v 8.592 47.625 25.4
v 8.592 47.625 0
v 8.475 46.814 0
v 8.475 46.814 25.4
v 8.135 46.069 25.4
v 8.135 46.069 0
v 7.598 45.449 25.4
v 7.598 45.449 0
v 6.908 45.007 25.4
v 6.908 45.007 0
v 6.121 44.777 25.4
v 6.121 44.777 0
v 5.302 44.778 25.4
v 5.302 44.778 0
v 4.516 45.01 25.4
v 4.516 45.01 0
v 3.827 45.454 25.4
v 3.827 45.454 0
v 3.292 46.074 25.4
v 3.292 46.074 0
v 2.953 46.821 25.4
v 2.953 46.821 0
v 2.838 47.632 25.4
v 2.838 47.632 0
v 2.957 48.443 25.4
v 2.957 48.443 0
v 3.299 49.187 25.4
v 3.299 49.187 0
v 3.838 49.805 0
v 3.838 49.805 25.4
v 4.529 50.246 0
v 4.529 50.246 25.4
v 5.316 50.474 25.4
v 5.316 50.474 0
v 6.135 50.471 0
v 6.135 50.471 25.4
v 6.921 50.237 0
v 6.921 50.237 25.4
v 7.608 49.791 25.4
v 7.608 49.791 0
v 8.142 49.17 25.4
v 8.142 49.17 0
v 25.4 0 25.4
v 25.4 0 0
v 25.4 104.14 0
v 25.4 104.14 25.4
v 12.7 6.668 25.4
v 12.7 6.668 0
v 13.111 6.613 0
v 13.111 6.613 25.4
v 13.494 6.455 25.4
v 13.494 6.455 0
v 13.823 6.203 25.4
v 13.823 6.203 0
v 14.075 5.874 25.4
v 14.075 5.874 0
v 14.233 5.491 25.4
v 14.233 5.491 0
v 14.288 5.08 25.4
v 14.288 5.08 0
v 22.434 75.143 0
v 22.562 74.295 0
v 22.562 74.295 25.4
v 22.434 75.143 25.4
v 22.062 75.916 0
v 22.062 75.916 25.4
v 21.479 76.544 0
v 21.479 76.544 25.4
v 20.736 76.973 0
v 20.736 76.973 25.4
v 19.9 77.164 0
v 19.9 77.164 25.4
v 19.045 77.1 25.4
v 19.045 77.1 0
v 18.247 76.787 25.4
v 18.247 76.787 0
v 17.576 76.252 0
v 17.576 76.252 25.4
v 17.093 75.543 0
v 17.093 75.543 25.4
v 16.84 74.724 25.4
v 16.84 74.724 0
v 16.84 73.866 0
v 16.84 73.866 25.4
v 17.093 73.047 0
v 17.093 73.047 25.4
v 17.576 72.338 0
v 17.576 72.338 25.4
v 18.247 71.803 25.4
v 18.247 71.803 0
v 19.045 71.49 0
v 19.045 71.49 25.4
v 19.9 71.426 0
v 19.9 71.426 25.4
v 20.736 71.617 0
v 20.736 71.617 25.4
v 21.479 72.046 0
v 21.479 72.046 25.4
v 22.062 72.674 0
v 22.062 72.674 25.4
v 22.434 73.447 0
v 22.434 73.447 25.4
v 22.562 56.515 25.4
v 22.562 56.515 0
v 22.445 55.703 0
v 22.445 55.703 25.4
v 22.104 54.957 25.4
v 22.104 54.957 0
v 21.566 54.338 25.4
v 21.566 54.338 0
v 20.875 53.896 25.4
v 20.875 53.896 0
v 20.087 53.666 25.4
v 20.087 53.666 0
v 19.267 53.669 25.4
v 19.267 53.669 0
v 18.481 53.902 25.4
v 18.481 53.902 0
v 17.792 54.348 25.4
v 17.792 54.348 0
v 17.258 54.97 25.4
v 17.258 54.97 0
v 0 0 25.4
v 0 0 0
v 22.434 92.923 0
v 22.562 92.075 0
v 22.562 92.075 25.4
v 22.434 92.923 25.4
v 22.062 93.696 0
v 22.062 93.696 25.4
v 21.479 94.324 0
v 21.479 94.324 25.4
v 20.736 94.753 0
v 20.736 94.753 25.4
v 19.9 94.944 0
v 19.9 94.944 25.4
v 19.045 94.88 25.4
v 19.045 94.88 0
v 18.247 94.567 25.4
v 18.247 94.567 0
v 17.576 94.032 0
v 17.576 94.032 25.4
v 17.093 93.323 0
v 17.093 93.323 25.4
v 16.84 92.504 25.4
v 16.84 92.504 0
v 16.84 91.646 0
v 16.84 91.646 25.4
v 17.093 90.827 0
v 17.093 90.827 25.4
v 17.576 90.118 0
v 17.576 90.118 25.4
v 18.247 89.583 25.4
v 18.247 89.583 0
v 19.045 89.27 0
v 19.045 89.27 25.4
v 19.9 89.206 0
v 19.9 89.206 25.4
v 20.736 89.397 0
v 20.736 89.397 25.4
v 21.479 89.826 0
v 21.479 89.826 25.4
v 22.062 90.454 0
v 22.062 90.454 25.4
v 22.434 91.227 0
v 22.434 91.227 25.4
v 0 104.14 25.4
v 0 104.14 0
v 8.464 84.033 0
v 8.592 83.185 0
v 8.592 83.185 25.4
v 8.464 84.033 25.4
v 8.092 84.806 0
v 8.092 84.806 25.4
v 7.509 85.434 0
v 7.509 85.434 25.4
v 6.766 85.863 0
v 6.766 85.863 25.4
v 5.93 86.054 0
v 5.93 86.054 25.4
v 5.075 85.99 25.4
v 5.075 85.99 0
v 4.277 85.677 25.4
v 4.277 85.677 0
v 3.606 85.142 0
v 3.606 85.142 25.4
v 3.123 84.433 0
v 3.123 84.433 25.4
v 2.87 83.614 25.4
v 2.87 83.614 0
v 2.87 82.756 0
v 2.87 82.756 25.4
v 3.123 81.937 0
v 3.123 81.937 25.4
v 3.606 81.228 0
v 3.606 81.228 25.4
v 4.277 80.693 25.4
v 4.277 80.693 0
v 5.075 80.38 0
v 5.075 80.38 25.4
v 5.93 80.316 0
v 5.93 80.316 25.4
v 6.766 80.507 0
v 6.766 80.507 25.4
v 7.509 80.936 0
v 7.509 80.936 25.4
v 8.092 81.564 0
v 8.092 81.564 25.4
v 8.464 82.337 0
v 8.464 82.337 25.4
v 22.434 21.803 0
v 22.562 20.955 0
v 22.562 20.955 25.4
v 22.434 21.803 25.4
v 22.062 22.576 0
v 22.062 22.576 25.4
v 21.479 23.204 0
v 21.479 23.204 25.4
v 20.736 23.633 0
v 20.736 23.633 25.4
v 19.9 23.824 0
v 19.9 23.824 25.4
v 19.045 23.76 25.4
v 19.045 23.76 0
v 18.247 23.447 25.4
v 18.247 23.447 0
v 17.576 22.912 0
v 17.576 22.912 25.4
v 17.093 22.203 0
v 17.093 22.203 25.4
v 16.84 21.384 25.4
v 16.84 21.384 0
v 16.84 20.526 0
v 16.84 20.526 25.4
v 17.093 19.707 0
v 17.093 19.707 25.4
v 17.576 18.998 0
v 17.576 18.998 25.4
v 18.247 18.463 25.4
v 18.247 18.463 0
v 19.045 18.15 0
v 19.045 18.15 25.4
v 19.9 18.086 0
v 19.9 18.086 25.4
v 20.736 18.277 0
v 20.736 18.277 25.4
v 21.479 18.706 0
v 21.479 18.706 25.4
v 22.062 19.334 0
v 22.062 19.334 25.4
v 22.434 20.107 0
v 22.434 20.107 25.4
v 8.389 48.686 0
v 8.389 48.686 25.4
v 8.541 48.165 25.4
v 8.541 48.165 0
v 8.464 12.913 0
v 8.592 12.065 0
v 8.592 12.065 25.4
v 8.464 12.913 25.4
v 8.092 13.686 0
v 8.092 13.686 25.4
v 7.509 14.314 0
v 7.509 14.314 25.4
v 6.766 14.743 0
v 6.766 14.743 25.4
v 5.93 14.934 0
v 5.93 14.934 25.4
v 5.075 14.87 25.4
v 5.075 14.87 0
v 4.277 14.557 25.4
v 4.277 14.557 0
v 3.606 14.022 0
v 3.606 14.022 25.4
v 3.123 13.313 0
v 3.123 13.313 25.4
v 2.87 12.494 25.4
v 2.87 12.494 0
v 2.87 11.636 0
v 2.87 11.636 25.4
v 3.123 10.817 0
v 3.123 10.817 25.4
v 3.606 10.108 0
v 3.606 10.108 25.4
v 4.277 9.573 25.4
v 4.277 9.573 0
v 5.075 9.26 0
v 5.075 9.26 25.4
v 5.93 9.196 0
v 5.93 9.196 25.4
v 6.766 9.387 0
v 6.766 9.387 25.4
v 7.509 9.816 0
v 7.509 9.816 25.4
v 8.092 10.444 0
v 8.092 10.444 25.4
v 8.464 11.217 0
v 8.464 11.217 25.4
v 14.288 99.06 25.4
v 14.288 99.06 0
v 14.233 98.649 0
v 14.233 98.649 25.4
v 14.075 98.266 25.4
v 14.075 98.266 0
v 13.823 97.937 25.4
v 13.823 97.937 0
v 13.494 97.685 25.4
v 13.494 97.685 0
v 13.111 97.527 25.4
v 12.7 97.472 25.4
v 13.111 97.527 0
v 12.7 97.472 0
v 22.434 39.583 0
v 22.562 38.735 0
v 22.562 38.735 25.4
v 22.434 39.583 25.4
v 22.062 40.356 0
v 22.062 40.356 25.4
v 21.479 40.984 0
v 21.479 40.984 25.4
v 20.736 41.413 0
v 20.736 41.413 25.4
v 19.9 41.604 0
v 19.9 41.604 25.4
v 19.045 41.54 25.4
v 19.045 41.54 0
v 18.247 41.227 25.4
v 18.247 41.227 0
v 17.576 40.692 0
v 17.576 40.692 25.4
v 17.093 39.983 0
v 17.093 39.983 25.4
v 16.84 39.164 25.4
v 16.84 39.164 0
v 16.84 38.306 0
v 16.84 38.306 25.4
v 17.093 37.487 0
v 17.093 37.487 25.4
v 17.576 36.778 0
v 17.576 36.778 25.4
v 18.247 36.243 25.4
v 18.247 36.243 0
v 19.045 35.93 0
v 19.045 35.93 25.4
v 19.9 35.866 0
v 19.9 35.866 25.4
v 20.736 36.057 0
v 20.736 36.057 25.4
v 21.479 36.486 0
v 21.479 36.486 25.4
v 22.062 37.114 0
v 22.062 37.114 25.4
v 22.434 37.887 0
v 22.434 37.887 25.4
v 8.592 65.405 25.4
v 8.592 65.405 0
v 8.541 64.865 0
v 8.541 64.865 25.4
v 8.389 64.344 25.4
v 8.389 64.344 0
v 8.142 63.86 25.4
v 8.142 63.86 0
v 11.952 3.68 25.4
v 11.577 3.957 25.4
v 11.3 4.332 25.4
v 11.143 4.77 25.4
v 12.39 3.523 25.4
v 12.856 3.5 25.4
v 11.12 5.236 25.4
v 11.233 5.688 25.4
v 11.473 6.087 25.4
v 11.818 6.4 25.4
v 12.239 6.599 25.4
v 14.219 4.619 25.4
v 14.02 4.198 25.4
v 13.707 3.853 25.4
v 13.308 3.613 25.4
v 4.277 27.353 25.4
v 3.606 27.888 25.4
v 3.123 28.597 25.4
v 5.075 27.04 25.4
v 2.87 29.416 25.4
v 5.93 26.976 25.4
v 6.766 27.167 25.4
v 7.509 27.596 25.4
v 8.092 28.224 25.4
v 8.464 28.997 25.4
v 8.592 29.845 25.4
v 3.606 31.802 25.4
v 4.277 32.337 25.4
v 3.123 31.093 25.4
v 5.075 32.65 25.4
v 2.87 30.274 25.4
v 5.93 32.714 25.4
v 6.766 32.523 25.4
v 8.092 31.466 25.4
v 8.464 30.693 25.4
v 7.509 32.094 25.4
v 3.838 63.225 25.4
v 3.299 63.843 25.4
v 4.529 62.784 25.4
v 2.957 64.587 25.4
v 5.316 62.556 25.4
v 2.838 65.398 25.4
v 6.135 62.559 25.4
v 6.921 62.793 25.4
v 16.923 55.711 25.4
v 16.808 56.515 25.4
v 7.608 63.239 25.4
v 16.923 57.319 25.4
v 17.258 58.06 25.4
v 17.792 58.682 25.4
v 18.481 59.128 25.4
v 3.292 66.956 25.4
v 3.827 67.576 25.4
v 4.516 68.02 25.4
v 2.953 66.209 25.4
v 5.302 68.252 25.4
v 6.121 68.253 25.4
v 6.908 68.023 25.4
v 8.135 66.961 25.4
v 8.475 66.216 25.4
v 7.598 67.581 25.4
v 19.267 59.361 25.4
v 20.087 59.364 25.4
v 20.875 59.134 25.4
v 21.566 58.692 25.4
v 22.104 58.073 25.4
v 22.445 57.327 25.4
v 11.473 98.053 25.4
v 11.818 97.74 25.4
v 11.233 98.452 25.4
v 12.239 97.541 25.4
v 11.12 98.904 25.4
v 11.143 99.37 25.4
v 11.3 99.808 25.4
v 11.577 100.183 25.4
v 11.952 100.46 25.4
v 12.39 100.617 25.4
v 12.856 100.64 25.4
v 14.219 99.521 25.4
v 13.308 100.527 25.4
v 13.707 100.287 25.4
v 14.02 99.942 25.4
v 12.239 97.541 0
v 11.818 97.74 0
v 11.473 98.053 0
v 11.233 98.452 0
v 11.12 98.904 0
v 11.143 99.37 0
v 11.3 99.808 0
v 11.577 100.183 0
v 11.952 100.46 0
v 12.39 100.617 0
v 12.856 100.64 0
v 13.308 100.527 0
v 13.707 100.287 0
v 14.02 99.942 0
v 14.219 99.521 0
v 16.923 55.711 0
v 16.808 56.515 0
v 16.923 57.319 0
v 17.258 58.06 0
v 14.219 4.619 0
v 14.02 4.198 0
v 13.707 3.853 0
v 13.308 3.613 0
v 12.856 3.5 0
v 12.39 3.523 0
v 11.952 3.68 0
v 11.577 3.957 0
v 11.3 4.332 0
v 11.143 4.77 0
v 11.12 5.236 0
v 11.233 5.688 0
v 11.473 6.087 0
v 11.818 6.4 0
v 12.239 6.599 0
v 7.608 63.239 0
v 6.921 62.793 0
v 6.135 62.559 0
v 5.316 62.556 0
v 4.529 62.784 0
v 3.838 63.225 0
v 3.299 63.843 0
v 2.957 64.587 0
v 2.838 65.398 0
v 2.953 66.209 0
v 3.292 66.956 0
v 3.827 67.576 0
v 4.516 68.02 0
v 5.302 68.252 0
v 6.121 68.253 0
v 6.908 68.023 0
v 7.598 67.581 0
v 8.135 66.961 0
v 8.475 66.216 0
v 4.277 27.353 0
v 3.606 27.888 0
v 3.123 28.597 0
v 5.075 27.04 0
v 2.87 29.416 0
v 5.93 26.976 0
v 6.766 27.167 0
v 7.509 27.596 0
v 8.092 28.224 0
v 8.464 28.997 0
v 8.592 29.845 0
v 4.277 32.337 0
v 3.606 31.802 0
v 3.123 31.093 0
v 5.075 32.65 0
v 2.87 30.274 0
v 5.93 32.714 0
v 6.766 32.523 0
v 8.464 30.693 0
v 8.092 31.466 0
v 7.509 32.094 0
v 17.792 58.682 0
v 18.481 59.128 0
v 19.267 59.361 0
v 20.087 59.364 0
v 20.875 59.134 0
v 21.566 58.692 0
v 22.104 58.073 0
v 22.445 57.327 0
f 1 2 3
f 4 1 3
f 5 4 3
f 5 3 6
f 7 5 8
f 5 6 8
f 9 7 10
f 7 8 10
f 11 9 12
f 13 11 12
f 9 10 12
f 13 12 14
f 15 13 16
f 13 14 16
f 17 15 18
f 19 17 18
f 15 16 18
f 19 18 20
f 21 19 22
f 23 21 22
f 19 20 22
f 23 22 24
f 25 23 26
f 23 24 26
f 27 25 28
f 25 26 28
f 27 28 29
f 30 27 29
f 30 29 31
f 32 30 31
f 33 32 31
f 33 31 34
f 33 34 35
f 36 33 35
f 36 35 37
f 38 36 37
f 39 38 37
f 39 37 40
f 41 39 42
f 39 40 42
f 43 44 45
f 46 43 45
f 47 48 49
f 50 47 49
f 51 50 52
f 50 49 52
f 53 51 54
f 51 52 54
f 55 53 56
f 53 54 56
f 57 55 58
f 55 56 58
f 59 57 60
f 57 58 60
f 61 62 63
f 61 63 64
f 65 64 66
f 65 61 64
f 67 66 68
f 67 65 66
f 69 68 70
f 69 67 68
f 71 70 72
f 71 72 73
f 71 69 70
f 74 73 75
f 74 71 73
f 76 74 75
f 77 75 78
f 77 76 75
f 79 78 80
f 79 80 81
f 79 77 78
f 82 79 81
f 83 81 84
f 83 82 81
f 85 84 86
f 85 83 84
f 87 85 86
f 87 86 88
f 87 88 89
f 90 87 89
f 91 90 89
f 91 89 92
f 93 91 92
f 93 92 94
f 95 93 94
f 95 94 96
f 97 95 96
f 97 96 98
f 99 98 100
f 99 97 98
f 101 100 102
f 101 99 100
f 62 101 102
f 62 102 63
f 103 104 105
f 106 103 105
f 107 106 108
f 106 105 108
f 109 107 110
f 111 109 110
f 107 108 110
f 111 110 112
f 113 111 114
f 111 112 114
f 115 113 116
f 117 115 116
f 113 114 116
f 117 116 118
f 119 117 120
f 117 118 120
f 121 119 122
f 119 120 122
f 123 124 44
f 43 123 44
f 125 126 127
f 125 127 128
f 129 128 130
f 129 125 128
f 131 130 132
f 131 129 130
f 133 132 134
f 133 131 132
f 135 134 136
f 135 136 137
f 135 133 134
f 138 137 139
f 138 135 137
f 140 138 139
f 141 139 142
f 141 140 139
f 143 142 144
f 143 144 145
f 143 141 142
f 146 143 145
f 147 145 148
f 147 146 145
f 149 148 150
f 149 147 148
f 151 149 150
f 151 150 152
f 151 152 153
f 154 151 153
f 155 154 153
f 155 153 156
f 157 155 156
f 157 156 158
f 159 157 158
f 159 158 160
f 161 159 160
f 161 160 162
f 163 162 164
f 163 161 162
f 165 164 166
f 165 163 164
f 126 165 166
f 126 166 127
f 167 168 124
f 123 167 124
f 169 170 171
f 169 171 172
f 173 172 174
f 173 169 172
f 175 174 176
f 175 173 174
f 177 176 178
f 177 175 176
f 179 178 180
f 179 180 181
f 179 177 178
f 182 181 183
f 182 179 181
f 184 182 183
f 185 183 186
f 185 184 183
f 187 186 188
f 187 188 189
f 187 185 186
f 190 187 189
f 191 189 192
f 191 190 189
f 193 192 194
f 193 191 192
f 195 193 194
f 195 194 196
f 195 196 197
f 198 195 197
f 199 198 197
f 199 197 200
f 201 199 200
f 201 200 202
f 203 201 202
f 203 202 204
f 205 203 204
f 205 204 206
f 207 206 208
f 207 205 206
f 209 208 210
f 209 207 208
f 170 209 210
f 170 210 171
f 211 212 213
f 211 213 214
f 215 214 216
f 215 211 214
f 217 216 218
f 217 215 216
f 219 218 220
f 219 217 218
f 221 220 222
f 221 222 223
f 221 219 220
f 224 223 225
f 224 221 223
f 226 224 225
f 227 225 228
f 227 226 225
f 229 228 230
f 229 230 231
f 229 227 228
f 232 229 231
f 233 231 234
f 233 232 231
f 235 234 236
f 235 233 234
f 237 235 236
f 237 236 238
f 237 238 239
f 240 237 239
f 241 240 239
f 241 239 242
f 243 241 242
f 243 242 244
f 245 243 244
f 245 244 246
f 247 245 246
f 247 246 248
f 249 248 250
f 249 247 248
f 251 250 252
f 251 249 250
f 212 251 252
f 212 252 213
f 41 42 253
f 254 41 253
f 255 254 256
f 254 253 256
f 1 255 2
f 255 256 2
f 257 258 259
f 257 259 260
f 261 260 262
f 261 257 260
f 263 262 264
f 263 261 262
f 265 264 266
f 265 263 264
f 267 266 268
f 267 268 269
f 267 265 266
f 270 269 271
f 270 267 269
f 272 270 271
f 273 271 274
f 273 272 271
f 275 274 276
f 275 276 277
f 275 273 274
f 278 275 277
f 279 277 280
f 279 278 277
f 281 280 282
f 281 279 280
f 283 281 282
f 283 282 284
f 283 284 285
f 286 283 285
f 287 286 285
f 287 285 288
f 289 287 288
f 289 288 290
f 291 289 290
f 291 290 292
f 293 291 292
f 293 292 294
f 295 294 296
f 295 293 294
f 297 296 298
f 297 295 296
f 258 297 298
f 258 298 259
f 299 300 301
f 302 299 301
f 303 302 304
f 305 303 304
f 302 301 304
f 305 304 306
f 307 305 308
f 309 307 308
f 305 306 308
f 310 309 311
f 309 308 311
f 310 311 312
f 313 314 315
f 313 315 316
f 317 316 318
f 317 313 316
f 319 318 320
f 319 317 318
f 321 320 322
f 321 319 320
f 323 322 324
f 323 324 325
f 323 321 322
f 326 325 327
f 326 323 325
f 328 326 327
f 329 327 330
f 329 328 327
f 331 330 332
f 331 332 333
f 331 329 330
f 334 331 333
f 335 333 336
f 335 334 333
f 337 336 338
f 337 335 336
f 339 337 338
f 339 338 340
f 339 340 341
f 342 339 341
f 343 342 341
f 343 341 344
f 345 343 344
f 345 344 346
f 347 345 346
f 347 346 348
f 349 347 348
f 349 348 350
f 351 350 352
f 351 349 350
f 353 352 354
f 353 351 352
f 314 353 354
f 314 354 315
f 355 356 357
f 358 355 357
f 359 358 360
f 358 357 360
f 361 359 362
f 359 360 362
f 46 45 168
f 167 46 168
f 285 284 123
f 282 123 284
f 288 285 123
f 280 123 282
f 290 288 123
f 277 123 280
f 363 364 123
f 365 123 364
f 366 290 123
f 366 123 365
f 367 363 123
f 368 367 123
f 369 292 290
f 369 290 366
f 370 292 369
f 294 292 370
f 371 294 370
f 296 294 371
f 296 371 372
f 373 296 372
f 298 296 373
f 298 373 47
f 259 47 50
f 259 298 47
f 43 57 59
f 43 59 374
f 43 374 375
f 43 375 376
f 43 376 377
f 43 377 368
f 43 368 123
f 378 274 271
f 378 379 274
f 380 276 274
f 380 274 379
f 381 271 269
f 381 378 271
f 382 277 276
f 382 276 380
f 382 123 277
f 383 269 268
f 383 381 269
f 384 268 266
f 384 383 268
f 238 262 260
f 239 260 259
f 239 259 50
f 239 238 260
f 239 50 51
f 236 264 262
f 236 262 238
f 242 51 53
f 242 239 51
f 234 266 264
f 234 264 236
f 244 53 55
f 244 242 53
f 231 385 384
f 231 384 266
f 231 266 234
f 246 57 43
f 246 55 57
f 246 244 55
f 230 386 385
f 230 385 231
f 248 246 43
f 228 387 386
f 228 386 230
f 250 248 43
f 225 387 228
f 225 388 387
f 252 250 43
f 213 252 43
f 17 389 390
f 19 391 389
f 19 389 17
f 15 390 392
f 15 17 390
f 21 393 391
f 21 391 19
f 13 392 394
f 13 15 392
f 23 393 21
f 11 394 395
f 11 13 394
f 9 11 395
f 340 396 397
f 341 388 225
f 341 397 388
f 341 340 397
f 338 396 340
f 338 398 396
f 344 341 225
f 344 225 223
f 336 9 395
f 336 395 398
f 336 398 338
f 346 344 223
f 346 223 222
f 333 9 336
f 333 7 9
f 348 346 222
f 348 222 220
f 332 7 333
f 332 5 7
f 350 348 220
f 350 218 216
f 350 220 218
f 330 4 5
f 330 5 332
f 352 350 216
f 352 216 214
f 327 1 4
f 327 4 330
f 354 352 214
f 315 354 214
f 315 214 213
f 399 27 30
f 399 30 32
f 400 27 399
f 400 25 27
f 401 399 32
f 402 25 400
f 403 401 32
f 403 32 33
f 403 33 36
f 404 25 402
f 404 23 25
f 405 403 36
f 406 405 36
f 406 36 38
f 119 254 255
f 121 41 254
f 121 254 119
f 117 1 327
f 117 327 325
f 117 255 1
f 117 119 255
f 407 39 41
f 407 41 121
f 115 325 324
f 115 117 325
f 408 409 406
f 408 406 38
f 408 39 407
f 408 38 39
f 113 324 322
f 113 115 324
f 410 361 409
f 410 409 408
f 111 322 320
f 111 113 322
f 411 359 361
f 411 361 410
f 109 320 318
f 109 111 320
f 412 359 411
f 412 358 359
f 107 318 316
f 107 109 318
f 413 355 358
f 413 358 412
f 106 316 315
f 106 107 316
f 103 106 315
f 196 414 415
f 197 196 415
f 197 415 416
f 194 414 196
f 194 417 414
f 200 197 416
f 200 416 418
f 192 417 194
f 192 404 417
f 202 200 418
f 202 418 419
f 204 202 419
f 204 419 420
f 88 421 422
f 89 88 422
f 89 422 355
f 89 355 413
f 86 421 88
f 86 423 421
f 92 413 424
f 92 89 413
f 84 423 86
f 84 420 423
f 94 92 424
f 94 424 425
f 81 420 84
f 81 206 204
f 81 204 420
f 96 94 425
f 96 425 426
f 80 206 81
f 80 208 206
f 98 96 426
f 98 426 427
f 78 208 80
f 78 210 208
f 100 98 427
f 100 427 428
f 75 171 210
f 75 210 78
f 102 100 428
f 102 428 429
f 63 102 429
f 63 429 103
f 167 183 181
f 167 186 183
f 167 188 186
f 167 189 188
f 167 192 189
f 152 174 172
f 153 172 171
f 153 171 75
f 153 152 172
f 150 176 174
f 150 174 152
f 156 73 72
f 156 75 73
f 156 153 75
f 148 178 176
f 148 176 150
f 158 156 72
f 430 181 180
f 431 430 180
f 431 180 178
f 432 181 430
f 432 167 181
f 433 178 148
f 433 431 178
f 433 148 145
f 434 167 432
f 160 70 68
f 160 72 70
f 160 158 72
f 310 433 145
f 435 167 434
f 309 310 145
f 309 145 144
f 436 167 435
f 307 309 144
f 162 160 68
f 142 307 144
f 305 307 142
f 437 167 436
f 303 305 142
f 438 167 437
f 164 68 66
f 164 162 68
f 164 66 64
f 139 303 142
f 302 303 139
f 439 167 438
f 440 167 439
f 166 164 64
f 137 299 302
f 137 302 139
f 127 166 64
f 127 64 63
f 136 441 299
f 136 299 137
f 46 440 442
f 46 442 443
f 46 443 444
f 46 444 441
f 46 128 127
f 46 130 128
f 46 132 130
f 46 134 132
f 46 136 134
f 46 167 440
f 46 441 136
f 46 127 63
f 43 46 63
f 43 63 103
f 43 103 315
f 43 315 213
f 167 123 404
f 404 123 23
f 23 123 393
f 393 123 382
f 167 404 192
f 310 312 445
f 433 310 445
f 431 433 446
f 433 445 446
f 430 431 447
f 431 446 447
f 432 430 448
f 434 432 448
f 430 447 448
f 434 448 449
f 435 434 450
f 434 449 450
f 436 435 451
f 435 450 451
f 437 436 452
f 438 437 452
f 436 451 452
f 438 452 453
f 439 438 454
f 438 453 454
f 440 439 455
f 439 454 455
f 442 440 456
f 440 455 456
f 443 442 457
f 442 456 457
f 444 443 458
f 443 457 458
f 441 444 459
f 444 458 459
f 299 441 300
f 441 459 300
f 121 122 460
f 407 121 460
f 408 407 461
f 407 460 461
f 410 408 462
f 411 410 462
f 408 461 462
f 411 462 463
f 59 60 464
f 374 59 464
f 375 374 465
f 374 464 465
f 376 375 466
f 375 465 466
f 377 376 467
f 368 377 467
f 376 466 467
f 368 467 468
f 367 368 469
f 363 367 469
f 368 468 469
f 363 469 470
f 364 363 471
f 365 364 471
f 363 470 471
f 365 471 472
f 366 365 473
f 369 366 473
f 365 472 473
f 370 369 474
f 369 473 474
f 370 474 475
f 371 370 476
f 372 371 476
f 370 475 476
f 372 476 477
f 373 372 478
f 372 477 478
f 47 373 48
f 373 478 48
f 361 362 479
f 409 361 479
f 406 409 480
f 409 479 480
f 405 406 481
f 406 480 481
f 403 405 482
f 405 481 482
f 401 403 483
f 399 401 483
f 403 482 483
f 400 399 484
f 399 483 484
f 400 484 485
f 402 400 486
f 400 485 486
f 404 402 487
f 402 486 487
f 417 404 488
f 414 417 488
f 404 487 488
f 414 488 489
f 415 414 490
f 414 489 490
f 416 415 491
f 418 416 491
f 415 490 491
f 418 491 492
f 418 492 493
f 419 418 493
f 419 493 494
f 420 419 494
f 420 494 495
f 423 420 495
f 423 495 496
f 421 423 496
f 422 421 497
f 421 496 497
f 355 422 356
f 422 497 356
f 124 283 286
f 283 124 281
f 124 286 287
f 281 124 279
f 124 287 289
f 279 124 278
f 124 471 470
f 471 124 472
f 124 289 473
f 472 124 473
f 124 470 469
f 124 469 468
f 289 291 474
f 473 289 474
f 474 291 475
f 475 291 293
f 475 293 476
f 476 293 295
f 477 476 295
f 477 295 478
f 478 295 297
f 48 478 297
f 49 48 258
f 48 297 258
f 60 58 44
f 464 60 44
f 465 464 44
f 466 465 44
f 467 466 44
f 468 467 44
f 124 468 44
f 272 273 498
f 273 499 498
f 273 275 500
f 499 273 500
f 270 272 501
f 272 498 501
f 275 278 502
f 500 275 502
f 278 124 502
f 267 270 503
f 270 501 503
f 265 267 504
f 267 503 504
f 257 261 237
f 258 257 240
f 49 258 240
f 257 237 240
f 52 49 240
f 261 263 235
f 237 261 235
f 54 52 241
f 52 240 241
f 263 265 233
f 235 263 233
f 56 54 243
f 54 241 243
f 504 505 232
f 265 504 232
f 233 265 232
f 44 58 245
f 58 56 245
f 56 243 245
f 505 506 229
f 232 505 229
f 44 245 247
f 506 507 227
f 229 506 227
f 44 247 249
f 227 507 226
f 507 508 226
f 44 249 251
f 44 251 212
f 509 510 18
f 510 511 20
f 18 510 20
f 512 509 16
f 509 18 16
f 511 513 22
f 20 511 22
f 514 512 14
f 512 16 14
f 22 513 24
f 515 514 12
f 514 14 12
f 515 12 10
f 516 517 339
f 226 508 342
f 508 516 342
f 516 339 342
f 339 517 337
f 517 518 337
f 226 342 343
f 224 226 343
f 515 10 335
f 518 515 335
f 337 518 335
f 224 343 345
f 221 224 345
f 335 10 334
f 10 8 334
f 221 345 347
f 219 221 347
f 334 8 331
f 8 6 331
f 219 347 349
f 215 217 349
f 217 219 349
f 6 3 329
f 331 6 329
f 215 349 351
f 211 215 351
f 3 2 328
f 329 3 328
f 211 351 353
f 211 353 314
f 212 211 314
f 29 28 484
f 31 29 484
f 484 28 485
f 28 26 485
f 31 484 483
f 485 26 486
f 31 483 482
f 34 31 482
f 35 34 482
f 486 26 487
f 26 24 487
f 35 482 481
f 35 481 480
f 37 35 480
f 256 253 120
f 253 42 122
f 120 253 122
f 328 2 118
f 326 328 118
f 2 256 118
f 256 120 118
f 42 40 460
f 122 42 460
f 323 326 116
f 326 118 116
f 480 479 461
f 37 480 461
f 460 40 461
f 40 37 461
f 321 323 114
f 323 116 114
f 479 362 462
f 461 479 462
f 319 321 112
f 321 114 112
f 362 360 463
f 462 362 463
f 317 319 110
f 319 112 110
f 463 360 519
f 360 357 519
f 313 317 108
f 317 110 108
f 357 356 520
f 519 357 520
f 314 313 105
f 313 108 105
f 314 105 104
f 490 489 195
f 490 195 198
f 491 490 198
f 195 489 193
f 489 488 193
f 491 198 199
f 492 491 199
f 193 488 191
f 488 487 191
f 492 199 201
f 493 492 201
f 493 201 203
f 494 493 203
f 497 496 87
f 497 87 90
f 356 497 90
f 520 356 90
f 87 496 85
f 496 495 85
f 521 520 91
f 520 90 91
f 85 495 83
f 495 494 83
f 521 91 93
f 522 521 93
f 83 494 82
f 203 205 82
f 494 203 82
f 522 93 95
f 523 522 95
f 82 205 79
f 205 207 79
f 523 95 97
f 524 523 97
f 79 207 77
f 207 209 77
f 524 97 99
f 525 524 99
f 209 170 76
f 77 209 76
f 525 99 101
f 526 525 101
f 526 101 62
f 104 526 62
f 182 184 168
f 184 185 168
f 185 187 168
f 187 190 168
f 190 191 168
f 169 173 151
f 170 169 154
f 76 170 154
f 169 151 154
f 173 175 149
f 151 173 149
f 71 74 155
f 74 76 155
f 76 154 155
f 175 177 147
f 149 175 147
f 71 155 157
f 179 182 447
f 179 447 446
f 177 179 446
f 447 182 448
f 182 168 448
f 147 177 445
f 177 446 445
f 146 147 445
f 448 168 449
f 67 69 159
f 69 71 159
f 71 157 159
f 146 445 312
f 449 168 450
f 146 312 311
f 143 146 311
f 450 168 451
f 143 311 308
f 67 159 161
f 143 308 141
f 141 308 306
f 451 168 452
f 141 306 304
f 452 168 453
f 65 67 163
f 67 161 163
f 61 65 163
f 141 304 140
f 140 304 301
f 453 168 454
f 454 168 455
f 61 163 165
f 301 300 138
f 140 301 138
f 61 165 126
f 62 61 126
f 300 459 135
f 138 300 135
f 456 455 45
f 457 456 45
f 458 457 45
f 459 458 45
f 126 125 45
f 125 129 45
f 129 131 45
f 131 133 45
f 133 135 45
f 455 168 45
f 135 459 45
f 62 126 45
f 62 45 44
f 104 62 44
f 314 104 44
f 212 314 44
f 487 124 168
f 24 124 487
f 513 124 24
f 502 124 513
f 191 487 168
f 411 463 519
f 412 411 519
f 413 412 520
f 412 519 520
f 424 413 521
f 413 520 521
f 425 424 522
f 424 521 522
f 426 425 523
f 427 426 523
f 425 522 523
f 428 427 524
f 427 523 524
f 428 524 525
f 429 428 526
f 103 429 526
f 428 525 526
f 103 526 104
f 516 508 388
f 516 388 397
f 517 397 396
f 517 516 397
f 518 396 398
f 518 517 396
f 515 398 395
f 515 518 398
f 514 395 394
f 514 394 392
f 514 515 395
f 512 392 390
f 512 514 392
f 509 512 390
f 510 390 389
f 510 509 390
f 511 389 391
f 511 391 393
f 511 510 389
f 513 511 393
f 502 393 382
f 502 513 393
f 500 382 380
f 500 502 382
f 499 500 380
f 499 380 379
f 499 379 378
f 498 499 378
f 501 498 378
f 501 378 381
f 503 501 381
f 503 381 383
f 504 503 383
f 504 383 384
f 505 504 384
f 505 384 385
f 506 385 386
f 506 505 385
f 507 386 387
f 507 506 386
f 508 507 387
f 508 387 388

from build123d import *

# Parameters (mm, degrees)
F0_R     = 2.8769537575
F1_DEPTH = 25.4


with BuildPart() as f1:
    # F0 (on Top) → F1 (new body)
    with BuildSketch(Plane.XY):
        Polygon((0, 52.07), (0, 0), (25.4, 0), (25.4, 104.14), (0, 104.14), align=None)
        with Locations((5.715, 12.065)):
            Circle(F0_R, mode=Mode.SUBTRACT)
        with BuildLine():
            ThreePointArc((14.2875, 5.08), (11.5774679849, 3.9574679849), (12.7, 6.6675))
            ThreePointArc((12.7, 6.6675), (13.8225320151, 6.2025320151), (14.2875, 5.08))
        make_face(mode=Mode.SUBTRACT)
        with Locations((5.715, 29.845)):
            Circle(F0_R, mode=Mode.SUBTRACT)
        with BuildLine():
            ThreePointArc((8.5919537575, 47.625), (2.9527786647, 46.820639249), (8.1421750872, 49.1695659646))
            ThreePointArc((8.1421750872, 49.1695659646), (8.4772213353, 48.429360751), (8.5919537575, 47.625))
        make_face(mode=Mode.SUBTRACT)
        with Locations((19.685, 20.955)):
            Circle(F0_R, mode=Mode.SUBTRACT)
        with Locations((19.685, 38.735)):
            Circle(F0_R, mode=Mode.SUBTRACT)
        with BuildLine():
            ThreePointArc((8.5919537575, 65.405), (8.4772213353, 64.600639249), (8.1421750872, 63.8604340354))
            ThreePointArc((8.1421750872, 63.8604340354), (2.9527786647, 66.209360751), (8.5919537575, 65.405))
        make_face(mode=Mode.SUBTRACT)
        with Locations((5.715, 83.185)):
            Circle(F0_R, mode=Mode.SUBTRACT)
        with BuildLine():
            ThreePointArc((14.2875, 99.06), (13.8225320151, 97.9374679849), (12.7, 97.4725))
            ThreePointArc((12.7, 97.4725), (11.5774679849, 100.1825320151), (14.2875, 99.06))
        make_face(mode=Mode.SUBTRACT)
        with BuildLine():
            Line((17.2578249128, 54.9704340354), (12.7, 52.07))
            Line((12.7, 52.07), (12.7, 60.96))
            Line((12.7, 60.96), (17.2578249128, 58.0595659646))
            ThreePointArc((17.2578249128, 58.0595659646), (20.489360751, 59.2772213353), (22.5619537575, 56.515))
            ThreePointArc((22.5619537575, 56.515), (20.489360751, 53.7527786647), (17.2578249128, 54.9704340354))
        make_face(mode=Mode.SUBTRACT)
        with Locations((19.685, 74.295)):
            Circle(F0_R, mode=Mode.SUBTRACT)
        with Locations((19.685, 92.075)):
            Circle(F0_R, mode=Mode.SUBTRACT)
        with BuildLine():
            Line((12.7, 60.96), (12.7, 52.07))
            Line((12.7, 52.07), (17.2578249128, 54.9704340354))
            ThreePointArc((17.2578249128, 54.9704340354), (16.8080462425, 56.515), (17.2578249128, 58.0595659646))
            Line((17.2578249128, 58.0595659646), (12.7, 60.96))
        make_face()
    extrude(amount=F1_DEPTH)


solid = f1.part
